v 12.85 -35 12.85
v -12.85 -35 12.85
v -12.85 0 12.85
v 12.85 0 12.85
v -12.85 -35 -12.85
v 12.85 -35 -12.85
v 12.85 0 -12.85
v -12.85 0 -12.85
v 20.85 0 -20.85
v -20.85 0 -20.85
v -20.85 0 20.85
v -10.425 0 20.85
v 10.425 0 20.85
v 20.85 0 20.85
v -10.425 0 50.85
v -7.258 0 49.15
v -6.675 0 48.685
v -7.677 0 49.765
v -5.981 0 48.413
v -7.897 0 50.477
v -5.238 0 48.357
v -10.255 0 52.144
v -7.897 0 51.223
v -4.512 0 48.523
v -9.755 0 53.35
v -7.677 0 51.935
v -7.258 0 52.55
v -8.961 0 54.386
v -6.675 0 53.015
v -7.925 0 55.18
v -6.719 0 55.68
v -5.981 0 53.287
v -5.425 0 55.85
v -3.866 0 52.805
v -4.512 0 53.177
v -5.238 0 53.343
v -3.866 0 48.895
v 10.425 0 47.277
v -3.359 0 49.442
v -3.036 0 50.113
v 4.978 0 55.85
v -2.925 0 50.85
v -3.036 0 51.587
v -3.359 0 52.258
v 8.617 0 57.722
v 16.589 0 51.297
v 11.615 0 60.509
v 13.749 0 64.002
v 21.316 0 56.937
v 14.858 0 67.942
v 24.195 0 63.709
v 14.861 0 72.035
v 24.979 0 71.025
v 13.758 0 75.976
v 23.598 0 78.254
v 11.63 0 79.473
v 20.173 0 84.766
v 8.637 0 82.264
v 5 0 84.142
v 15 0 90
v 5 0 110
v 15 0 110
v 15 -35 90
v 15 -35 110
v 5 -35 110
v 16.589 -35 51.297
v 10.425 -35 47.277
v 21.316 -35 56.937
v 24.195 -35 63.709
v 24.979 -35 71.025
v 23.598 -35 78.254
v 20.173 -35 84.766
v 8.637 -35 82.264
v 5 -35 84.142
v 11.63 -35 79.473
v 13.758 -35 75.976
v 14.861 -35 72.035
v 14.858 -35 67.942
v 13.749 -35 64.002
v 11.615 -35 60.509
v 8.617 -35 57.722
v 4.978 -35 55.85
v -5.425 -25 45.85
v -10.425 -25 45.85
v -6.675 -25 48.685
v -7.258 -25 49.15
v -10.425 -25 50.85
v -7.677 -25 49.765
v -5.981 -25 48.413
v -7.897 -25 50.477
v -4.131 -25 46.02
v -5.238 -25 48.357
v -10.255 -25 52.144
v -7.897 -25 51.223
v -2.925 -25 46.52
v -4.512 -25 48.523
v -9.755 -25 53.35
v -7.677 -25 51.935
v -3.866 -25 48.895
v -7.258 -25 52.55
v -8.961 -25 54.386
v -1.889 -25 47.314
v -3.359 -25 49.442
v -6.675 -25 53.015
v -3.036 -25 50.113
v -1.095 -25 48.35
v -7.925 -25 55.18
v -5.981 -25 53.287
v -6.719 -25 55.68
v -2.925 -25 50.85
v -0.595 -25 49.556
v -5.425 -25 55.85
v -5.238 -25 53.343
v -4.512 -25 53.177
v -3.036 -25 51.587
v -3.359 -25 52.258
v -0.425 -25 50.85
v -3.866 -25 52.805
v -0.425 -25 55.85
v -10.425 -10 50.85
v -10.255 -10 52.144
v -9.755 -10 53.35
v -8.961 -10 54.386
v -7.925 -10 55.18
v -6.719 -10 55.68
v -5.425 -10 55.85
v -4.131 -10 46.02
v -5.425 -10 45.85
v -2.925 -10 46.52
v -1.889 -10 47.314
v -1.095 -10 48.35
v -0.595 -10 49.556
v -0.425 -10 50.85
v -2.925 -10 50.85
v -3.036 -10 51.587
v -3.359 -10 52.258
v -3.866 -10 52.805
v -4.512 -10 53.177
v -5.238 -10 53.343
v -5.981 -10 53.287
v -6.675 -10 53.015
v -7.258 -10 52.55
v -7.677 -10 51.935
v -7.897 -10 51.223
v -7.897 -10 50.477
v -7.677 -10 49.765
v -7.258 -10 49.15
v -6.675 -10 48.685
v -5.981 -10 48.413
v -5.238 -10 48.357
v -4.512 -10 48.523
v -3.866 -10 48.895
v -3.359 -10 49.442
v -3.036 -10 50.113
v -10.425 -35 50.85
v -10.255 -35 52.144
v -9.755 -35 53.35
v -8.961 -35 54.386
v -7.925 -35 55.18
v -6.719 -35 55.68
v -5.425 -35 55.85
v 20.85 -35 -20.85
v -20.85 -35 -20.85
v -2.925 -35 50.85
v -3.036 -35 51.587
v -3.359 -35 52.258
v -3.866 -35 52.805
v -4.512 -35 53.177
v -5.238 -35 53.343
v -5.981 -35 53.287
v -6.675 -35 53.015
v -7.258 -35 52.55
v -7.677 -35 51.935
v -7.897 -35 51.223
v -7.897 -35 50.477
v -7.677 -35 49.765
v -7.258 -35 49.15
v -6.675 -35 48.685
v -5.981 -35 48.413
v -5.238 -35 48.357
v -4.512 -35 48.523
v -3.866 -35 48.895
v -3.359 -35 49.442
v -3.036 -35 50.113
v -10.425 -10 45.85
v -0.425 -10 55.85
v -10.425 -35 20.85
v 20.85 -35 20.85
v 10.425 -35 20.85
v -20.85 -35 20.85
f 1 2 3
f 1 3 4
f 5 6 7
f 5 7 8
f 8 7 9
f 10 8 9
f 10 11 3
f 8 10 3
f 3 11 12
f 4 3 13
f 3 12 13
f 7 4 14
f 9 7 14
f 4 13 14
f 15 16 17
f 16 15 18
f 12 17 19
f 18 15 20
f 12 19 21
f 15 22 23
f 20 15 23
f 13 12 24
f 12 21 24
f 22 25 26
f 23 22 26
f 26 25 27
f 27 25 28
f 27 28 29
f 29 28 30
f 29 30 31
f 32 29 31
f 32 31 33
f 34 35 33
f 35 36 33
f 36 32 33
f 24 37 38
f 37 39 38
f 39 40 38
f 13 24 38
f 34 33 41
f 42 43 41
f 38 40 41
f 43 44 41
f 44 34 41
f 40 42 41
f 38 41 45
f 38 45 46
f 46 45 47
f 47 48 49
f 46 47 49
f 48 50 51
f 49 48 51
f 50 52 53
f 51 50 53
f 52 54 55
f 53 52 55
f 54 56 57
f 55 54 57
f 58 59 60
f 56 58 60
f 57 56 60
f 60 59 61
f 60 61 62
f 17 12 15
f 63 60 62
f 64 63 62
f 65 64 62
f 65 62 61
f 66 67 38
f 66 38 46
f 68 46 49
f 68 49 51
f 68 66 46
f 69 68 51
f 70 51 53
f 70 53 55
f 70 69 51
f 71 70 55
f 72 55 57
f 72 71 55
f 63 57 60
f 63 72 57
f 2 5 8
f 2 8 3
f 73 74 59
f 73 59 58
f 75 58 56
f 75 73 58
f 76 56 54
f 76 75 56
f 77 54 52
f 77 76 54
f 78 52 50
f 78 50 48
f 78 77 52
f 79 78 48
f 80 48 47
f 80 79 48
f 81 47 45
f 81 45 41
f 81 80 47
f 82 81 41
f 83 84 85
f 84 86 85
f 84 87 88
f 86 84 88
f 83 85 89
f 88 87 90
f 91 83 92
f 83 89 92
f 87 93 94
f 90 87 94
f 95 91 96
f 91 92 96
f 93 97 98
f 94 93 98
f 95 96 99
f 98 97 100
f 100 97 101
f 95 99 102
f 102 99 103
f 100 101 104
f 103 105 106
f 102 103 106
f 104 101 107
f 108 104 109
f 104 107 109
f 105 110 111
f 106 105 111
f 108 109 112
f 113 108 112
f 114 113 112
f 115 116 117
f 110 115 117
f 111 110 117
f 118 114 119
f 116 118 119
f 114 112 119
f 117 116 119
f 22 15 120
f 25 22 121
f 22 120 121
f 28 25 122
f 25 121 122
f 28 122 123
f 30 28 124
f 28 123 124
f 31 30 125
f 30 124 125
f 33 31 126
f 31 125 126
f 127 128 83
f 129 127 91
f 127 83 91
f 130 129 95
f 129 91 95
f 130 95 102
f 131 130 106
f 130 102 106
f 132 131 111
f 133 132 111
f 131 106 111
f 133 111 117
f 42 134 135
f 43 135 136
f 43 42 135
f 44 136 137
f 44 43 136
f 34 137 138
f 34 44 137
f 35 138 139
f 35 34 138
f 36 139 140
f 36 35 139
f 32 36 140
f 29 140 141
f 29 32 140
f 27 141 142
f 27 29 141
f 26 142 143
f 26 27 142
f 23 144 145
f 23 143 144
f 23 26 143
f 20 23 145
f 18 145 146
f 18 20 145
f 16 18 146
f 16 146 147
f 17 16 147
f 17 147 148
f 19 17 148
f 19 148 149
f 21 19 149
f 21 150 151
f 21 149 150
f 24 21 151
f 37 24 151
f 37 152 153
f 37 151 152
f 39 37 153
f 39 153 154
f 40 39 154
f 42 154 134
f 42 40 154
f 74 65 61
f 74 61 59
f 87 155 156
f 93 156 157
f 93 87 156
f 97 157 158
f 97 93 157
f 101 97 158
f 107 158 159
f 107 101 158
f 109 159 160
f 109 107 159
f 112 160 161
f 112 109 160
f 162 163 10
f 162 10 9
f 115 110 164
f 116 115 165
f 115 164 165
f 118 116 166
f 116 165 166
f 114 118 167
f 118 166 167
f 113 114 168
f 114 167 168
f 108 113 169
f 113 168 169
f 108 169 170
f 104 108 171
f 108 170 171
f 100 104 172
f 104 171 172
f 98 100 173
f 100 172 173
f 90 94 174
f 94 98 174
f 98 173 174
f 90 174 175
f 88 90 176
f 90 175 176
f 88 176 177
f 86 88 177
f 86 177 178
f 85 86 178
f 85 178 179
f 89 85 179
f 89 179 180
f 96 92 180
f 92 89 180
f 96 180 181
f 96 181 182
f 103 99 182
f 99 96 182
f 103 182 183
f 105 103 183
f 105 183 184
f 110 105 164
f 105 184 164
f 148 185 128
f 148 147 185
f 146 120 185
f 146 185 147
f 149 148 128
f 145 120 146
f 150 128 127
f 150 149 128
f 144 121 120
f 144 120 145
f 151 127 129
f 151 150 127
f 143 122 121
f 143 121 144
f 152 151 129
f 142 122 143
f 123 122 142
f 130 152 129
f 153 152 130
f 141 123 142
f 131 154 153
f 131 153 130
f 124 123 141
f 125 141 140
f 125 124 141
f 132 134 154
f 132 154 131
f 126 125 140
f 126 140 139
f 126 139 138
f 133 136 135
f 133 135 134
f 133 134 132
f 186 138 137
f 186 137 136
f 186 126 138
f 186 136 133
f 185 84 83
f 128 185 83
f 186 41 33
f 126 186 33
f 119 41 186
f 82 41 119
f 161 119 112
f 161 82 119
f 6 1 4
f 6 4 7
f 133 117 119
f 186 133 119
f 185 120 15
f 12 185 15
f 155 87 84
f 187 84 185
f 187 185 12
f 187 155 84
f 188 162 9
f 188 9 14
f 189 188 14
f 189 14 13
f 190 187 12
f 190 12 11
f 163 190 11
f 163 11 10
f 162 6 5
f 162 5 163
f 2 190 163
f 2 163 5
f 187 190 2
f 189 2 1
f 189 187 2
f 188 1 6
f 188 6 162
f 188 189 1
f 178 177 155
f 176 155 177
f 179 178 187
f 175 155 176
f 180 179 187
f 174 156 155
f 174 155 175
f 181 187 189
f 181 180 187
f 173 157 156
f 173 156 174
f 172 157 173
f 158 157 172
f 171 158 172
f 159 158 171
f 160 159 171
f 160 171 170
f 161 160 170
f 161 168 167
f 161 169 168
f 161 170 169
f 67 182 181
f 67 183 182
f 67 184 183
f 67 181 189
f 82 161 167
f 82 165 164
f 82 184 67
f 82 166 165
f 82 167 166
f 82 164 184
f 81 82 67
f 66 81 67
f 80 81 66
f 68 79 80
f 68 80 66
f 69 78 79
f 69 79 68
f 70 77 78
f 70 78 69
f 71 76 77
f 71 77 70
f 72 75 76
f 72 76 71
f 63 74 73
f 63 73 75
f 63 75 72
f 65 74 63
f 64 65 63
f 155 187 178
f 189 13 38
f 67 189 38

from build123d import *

# Parameters (mm, degrees)
F0_R     = 2.5
F1_DEPTH = 15
F2_R     = 5
F4_DEPTH = 5
F5_DEPTH = 2.5


with BuildPart() as f1:
    # F0 (on Front) → F1 (new body)
    with BuildSketch(Plane.XZ):
        with BuildLine():
            Line((-20.85, 20.85), (-20.85, 0))
            Line((-20.85, 0), (-20.85, -20.85))
            Line((-20.85, -20.85), (0, -20.85))
            Line((0, -20.85), (20.85, -20.85))
            Line((20.85, -20.85), (20.85, 0))
            Line((20.85, 0), (20.85, 20.85))
            Line((20.85, 20.85), (10.425, 20.85))
            Line((10.425, 20.85), (10.425, 47.277337854))
            ThreePointArc((10.425, 47.277337854), (24.8578784585, 67.3380686447), (15, 90))
            Line((15, 90), (15, 110))
            Line((15, 110), (5, 110))
            Line((5, 110), (5, 84.1421356237))
            ThreePointArc((5, 84.1421356237), (14.9999953406, 69.9881770745), (4.9777002722, 55.85))
            Line((4.9777002722, 55.85), (-10.425, 55.85))
            Line((-10.425, 55.85), (-10.425, 20.85))
            Line((-10.425, 20.85), (-20.85, 20.85))
        make_face()
        Polygon((-12.85, 12.85), (0, 12.85), (12.85, 12.85), (12.85, 0), (12.85, -12.85), (0, -12.85), (-12.85, -12.85), (-12.85, 0), align=None, mode=Mode.SUBTRACT)
        with Locations((-5.425, 50.85)):
            Circle(F0_R, mode=Mode.SUBTRACT)
    extrude(amount=F1_DEPTH)

    # F2
    f2_edges = [f1.edges().sort_by_distance(p)[0] for p in [
        (-10.425, -7.5, 55.85),
    ]]
    fillet(f2_edges, radius=F2_R)

    # F3 (on face) → F4 (cut)
    with BuildSketch(Plane.XZ.offset(15)):
        with BuildLine():
            Line((-0.425, 55.85), (-5.425, 55.85))
            ThreePointArc((-5.425, 55.85), (-8.9605339059, 54.3855339059), (-10.425, 50.85))
            Line((-10.425, 50.85), (-10.425, 45.85))
            Line((-10.425, 45.85), (-5.425, 45.85))
            ThreePointArc((-5.425, 45.85), (-1.8894660941, 47.3144660941), (-0.425, 50.85))
            Line((-0.425, 50.85), (-0.425, 55.85))
        make_face()
    extrude(amount=-F4_DEPTH, mode=Mode.SUBTRACT)

    # F5 (add): a face of the model
    f5_faces = [f1.faces().sort_by_distance(p)[0] for p in [
        (4.1569852553, -15, 31.7276341026),
    ]]
    extrude(f5_faces, amount=F5_DEPTH)

    # F7: F1 across plane


with BuildPart() as f1_1:
    add(f1.part)
    add(f1.part.mirror(Plane.XZ.offset(17.5)))


solid = f1_1.part
